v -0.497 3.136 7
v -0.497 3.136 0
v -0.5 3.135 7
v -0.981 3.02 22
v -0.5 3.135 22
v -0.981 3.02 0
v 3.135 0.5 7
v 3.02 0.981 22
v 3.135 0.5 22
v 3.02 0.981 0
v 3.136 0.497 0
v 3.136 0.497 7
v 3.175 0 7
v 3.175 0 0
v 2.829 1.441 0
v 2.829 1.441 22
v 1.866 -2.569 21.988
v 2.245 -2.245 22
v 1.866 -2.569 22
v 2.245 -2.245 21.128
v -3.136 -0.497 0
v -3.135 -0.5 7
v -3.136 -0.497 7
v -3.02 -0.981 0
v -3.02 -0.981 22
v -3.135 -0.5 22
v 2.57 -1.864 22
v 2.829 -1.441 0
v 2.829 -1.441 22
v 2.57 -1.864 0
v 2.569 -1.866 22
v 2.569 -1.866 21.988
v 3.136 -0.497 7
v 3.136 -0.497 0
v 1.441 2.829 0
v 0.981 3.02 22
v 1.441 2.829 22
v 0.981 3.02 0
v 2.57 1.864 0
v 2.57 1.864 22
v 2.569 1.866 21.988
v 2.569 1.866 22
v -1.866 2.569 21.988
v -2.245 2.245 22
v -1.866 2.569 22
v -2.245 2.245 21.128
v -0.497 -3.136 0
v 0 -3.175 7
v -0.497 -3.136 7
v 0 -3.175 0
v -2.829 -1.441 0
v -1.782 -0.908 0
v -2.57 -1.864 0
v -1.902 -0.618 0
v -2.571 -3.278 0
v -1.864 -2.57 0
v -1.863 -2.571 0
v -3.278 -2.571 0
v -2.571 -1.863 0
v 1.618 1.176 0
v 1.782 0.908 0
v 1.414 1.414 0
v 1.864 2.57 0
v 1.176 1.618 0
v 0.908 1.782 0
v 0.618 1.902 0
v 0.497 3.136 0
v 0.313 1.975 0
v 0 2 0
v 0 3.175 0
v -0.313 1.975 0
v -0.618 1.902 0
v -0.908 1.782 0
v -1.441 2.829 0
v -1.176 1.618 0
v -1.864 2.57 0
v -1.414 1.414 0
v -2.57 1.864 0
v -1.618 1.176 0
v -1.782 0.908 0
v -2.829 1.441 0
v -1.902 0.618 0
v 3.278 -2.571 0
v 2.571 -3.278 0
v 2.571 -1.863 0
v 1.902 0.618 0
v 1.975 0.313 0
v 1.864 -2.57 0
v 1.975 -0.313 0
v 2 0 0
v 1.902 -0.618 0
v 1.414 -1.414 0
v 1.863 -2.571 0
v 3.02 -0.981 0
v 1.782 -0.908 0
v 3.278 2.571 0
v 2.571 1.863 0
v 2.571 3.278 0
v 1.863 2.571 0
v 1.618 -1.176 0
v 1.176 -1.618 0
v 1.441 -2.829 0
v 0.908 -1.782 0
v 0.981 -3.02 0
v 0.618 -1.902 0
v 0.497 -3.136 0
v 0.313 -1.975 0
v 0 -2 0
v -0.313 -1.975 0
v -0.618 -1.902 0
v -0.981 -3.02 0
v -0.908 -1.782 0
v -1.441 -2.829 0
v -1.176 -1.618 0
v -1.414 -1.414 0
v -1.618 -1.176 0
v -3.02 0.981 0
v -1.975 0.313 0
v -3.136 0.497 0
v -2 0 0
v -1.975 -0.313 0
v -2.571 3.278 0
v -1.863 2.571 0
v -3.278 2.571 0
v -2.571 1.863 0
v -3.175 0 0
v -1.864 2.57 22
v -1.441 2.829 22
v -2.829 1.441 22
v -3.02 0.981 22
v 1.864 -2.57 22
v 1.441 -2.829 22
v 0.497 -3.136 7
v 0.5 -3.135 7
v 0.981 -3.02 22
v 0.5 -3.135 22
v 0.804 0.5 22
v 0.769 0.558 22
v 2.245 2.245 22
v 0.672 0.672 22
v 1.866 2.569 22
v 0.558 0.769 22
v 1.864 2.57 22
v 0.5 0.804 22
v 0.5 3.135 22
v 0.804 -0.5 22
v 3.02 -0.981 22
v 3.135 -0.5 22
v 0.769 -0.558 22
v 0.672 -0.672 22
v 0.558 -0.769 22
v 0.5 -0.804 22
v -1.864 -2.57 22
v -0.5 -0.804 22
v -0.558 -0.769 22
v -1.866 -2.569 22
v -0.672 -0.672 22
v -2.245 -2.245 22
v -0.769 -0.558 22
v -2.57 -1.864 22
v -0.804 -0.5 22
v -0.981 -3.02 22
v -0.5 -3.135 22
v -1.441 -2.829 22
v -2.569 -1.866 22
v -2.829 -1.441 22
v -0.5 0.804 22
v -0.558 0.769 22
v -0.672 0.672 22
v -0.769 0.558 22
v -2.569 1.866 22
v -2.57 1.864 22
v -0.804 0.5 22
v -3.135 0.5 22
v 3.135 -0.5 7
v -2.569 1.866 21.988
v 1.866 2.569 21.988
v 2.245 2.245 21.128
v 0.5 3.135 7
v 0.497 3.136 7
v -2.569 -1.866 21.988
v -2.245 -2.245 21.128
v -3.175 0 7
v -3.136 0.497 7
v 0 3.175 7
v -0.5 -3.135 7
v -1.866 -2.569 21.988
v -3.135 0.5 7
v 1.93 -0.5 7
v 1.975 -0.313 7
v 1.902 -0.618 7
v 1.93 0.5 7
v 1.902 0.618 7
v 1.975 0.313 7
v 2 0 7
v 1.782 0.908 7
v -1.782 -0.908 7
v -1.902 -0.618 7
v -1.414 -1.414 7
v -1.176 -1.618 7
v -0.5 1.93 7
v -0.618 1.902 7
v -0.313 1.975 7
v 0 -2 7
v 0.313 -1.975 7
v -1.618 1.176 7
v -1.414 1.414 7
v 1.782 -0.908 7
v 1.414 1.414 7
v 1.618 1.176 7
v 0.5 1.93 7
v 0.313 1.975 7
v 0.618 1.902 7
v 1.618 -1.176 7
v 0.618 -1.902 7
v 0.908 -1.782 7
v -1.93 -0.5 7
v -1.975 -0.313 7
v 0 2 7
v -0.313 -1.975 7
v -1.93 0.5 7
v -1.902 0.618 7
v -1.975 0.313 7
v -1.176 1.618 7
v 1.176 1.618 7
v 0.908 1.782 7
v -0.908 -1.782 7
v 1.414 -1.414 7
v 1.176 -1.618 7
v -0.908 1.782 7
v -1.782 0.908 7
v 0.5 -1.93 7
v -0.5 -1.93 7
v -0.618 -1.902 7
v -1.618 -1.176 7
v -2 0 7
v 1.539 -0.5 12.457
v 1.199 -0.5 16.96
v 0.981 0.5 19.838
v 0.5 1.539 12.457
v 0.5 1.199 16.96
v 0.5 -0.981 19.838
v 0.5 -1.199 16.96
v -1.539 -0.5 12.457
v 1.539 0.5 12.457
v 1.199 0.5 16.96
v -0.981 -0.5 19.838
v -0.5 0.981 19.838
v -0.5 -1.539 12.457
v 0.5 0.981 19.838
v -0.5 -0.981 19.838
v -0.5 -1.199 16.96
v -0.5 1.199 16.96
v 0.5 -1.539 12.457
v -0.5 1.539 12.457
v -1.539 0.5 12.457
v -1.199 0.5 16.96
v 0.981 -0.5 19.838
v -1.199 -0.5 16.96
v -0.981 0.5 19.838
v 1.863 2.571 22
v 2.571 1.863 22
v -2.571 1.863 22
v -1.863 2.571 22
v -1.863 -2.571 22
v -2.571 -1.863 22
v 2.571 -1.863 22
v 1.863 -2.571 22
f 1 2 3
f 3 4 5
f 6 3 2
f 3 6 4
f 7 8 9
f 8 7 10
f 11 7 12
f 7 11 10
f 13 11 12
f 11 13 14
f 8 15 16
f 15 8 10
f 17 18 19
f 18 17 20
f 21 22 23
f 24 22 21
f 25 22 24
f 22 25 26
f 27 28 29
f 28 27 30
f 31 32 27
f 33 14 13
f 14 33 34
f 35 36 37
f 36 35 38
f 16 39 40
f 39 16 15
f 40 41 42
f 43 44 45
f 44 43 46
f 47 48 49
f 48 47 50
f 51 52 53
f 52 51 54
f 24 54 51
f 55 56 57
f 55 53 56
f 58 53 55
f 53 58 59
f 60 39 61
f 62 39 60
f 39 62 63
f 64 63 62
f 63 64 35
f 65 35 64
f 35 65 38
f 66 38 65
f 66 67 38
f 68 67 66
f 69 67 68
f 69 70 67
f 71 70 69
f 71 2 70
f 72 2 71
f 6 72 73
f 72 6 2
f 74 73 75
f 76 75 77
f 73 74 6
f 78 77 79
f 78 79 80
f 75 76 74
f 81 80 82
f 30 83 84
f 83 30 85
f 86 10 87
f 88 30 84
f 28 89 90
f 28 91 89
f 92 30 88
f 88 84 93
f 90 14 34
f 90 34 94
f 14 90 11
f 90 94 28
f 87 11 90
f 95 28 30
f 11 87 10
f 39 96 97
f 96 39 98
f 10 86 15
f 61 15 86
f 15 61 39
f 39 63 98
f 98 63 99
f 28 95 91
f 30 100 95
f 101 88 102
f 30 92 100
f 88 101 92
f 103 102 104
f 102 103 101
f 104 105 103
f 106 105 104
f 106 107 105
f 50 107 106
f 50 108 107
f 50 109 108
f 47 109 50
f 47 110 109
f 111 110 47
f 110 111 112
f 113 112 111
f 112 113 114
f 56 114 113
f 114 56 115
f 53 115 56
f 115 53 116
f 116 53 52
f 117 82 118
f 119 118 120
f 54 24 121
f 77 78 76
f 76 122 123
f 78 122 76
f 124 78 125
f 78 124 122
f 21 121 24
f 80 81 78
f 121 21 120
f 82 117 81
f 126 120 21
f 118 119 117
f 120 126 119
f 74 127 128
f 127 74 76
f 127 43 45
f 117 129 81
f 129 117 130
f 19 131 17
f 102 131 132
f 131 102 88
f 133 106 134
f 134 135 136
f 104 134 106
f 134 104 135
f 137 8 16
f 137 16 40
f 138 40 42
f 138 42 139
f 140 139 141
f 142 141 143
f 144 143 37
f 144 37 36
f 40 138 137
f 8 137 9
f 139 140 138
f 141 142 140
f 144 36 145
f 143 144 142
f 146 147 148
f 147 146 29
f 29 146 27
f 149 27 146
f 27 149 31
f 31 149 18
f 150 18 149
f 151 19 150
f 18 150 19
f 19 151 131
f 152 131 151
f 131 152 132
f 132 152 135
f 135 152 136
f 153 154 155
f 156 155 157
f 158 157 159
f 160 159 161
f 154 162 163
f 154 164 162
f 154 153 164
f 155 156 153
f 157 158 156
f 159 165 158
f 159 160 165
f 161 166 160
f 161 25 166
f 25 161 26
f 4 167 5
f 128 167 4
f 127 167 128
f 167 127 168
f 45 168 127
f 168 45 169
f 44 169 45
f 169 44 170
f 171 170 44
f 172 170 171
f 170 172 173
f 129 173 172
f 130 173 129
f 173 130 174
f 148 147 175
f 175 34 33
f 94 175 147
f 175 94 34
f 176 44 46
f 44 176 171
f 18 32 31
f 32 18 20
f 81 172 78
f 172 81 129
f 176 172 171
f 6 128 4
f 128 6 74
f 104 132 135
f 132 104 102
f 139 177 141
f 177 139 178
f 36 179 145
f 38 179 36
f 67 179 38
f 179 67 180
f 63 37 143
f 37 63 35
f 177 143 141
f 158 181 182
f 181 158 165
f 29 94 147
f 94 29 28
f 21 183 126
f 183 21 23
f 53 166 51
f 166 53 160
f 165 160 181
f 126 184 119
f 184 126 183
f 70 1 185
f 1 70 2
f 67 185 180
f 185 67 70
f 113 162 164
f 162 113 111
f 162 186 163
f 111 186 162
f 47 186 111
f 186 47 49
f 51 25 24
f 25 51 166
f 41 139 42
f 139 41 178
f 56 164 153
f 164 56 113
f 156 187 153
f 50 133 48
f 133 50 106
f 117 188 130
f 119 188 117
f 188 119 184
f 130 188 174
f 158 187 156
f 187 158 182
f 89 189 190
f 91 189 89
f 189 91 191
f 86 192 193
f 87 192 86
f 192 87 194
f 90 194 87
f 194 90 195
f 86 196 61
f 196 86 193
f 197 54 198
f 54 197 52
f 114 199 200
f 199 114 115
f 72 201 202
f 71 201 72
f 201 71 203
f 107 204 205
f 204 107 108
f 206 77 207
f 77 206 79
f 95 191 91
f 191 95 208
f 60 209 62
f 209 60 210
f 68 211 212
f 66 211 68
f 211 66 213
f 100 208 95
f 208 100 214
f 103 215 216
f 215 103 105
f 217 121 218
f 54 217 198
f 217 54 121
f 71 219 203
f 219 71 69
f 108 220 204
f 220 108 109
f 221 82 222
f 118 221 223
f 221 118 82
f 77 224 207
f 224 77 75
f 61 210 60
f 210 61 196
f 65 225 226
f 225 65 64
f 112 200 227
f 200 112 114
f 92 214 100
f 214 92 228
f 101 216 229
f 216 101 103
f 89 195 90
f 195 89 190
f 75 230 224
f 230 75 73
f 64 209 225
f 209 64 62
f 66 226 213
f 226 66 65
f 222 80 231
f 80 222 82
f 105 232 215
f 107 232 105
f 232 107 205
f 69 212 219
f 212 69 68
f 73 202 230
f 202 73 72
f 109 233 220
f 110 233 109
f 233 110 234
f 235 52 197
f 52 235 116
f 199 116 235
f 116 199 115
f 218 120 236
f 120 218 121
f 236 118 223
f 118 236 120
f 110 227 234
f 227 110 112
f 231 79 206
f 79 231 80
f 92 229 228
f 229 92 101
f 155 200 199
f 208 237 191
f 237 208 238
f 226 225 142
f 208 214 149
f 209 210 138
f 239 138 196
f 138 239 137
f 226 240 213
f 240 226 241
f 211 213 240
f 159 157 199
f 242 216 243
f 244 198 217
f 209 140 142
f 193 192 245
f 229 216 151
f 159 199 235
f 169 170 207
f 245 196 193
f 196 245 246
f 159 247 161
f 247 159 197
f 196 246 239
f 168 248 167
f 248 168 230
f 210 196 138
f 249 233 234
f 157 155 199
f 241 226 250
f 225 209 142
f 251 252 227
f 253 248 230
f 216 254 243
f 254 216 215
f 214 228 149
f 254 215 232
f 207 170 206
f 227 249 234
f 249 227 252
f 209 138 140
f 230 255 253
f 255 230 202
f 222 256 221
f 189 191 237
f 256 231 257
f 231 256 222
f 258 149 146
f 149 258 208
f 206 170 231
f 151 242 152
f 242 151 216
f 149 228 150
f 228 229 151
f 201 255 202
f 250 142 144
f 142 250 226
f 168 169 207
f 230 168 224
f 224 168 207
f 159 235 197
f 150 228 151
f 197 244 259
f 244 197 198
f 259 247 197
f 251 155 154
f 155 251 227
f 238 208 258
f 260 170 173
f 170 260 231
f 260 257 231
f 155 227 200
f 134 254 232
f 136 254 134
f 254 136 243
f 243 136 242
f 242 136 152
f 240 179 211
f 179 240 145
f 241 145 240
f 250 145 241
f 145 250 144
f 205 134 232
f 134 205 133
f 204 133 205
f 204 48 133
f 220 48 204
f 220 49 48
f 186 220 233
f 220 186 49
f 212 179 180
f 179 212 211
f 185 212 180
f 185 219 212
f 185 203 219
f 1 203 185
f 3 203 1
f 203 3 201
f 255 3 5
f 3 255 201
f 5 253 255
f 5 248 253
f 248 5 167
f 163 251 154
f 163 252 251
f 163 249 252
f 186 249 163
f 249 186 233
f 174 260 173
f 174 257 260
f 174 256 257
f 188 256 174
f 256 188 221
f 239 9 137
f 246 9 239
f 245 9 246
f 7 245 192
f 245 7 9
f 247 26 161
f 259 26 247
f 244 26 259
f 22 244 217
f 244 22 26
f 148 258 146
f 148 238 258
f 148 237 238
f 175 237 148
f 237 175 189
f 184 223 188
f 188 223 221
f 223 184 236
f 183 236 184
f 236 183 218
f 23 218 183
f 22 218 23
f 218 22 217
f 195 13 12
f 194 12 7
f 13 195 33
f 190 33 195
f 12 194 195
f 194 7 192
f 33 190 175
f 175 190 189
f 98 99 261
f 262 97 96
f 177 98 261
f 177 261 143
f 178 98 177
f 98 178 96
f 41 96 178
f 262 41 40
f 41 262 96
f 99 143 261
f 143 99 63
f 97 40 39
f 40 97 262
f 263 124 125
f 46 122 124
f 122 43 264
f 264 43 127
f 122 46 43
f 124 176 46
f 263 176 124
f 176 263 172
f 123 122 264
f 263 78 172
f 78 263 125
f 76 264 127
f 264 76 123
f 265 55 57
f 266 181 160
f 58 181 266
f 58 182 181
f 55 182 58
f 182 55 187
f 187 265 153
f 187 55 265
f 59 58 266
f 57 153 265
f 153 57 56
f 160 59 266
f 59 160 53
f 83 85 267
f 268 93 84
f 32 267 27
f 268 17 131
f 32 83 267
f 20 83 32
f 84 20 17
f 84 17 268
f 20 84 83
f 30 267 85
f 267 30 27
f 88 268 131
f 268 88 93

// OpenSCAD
$fn = 40;

length = 22;
taper_distance = 7;

screw_solid_diameter = 2.4;
screw_thread_diameter = 4;
screw_tension_adding_diameter = 0.5; // How much extra diameter (other than the thread diameter) to create by pressing the screw in.

pilot_hole_diameter = 6.35;
separator_thickness = 1.0;

flange_thickness = 1;
flange_protrusion = 1;
taper_angle = -5;

difference() {
    cylinder(d = pilot_hole_diameter, h = length);
    
    // Threaded screw hole for the taper
    cylinder(d = screw_thread_diameter, h = taper_distance);
    // Transition to solid screw hole the rest of the way
    translate([0, 0, taper_distance])
        cylinder(d1 = screw_thread_diameter, d2 = screw_solid_diameter - screw_tension_adding_diameter, h = length - taper_distance);
    
    // Create separator
    separator_length = length - taper_distance;
    translate([0, 0, separator_length / 2 + taper_distance])
        cube([separator_thickness, pilot_hole_diameter, separator_length], center = true);
    rotate([0, 0, 90])
    translate([0, 0, separator_length / 2 + taper_distance])
        cube([separator_thickness, pilot_hole_diameter, separator_length], center = true);
}

// Create flanges
for (i = [0 : 1 : 3]) {
    rotate([0, 0, 45 + i * 90])
        flange();
}

module flange() {
    circular_segment_offset = (pilot_hole_diameter / 2) - sqrt((pilot_hole_diameter / 2) * (pilot_hole_diameter / 2) - flange_thickness * flange_thickness / 4);
    translate([pilot_hole_diameter / 2 - circular_segment_offset, flange_thickness / 2, 0])
    rotate([90, 0, 0])
    linear_extrude(height = flange_thickness)
    polygon(points = 
        [
            [0, 0], [flange_protrusion, 0], [0, length]
        ]
    );
}
